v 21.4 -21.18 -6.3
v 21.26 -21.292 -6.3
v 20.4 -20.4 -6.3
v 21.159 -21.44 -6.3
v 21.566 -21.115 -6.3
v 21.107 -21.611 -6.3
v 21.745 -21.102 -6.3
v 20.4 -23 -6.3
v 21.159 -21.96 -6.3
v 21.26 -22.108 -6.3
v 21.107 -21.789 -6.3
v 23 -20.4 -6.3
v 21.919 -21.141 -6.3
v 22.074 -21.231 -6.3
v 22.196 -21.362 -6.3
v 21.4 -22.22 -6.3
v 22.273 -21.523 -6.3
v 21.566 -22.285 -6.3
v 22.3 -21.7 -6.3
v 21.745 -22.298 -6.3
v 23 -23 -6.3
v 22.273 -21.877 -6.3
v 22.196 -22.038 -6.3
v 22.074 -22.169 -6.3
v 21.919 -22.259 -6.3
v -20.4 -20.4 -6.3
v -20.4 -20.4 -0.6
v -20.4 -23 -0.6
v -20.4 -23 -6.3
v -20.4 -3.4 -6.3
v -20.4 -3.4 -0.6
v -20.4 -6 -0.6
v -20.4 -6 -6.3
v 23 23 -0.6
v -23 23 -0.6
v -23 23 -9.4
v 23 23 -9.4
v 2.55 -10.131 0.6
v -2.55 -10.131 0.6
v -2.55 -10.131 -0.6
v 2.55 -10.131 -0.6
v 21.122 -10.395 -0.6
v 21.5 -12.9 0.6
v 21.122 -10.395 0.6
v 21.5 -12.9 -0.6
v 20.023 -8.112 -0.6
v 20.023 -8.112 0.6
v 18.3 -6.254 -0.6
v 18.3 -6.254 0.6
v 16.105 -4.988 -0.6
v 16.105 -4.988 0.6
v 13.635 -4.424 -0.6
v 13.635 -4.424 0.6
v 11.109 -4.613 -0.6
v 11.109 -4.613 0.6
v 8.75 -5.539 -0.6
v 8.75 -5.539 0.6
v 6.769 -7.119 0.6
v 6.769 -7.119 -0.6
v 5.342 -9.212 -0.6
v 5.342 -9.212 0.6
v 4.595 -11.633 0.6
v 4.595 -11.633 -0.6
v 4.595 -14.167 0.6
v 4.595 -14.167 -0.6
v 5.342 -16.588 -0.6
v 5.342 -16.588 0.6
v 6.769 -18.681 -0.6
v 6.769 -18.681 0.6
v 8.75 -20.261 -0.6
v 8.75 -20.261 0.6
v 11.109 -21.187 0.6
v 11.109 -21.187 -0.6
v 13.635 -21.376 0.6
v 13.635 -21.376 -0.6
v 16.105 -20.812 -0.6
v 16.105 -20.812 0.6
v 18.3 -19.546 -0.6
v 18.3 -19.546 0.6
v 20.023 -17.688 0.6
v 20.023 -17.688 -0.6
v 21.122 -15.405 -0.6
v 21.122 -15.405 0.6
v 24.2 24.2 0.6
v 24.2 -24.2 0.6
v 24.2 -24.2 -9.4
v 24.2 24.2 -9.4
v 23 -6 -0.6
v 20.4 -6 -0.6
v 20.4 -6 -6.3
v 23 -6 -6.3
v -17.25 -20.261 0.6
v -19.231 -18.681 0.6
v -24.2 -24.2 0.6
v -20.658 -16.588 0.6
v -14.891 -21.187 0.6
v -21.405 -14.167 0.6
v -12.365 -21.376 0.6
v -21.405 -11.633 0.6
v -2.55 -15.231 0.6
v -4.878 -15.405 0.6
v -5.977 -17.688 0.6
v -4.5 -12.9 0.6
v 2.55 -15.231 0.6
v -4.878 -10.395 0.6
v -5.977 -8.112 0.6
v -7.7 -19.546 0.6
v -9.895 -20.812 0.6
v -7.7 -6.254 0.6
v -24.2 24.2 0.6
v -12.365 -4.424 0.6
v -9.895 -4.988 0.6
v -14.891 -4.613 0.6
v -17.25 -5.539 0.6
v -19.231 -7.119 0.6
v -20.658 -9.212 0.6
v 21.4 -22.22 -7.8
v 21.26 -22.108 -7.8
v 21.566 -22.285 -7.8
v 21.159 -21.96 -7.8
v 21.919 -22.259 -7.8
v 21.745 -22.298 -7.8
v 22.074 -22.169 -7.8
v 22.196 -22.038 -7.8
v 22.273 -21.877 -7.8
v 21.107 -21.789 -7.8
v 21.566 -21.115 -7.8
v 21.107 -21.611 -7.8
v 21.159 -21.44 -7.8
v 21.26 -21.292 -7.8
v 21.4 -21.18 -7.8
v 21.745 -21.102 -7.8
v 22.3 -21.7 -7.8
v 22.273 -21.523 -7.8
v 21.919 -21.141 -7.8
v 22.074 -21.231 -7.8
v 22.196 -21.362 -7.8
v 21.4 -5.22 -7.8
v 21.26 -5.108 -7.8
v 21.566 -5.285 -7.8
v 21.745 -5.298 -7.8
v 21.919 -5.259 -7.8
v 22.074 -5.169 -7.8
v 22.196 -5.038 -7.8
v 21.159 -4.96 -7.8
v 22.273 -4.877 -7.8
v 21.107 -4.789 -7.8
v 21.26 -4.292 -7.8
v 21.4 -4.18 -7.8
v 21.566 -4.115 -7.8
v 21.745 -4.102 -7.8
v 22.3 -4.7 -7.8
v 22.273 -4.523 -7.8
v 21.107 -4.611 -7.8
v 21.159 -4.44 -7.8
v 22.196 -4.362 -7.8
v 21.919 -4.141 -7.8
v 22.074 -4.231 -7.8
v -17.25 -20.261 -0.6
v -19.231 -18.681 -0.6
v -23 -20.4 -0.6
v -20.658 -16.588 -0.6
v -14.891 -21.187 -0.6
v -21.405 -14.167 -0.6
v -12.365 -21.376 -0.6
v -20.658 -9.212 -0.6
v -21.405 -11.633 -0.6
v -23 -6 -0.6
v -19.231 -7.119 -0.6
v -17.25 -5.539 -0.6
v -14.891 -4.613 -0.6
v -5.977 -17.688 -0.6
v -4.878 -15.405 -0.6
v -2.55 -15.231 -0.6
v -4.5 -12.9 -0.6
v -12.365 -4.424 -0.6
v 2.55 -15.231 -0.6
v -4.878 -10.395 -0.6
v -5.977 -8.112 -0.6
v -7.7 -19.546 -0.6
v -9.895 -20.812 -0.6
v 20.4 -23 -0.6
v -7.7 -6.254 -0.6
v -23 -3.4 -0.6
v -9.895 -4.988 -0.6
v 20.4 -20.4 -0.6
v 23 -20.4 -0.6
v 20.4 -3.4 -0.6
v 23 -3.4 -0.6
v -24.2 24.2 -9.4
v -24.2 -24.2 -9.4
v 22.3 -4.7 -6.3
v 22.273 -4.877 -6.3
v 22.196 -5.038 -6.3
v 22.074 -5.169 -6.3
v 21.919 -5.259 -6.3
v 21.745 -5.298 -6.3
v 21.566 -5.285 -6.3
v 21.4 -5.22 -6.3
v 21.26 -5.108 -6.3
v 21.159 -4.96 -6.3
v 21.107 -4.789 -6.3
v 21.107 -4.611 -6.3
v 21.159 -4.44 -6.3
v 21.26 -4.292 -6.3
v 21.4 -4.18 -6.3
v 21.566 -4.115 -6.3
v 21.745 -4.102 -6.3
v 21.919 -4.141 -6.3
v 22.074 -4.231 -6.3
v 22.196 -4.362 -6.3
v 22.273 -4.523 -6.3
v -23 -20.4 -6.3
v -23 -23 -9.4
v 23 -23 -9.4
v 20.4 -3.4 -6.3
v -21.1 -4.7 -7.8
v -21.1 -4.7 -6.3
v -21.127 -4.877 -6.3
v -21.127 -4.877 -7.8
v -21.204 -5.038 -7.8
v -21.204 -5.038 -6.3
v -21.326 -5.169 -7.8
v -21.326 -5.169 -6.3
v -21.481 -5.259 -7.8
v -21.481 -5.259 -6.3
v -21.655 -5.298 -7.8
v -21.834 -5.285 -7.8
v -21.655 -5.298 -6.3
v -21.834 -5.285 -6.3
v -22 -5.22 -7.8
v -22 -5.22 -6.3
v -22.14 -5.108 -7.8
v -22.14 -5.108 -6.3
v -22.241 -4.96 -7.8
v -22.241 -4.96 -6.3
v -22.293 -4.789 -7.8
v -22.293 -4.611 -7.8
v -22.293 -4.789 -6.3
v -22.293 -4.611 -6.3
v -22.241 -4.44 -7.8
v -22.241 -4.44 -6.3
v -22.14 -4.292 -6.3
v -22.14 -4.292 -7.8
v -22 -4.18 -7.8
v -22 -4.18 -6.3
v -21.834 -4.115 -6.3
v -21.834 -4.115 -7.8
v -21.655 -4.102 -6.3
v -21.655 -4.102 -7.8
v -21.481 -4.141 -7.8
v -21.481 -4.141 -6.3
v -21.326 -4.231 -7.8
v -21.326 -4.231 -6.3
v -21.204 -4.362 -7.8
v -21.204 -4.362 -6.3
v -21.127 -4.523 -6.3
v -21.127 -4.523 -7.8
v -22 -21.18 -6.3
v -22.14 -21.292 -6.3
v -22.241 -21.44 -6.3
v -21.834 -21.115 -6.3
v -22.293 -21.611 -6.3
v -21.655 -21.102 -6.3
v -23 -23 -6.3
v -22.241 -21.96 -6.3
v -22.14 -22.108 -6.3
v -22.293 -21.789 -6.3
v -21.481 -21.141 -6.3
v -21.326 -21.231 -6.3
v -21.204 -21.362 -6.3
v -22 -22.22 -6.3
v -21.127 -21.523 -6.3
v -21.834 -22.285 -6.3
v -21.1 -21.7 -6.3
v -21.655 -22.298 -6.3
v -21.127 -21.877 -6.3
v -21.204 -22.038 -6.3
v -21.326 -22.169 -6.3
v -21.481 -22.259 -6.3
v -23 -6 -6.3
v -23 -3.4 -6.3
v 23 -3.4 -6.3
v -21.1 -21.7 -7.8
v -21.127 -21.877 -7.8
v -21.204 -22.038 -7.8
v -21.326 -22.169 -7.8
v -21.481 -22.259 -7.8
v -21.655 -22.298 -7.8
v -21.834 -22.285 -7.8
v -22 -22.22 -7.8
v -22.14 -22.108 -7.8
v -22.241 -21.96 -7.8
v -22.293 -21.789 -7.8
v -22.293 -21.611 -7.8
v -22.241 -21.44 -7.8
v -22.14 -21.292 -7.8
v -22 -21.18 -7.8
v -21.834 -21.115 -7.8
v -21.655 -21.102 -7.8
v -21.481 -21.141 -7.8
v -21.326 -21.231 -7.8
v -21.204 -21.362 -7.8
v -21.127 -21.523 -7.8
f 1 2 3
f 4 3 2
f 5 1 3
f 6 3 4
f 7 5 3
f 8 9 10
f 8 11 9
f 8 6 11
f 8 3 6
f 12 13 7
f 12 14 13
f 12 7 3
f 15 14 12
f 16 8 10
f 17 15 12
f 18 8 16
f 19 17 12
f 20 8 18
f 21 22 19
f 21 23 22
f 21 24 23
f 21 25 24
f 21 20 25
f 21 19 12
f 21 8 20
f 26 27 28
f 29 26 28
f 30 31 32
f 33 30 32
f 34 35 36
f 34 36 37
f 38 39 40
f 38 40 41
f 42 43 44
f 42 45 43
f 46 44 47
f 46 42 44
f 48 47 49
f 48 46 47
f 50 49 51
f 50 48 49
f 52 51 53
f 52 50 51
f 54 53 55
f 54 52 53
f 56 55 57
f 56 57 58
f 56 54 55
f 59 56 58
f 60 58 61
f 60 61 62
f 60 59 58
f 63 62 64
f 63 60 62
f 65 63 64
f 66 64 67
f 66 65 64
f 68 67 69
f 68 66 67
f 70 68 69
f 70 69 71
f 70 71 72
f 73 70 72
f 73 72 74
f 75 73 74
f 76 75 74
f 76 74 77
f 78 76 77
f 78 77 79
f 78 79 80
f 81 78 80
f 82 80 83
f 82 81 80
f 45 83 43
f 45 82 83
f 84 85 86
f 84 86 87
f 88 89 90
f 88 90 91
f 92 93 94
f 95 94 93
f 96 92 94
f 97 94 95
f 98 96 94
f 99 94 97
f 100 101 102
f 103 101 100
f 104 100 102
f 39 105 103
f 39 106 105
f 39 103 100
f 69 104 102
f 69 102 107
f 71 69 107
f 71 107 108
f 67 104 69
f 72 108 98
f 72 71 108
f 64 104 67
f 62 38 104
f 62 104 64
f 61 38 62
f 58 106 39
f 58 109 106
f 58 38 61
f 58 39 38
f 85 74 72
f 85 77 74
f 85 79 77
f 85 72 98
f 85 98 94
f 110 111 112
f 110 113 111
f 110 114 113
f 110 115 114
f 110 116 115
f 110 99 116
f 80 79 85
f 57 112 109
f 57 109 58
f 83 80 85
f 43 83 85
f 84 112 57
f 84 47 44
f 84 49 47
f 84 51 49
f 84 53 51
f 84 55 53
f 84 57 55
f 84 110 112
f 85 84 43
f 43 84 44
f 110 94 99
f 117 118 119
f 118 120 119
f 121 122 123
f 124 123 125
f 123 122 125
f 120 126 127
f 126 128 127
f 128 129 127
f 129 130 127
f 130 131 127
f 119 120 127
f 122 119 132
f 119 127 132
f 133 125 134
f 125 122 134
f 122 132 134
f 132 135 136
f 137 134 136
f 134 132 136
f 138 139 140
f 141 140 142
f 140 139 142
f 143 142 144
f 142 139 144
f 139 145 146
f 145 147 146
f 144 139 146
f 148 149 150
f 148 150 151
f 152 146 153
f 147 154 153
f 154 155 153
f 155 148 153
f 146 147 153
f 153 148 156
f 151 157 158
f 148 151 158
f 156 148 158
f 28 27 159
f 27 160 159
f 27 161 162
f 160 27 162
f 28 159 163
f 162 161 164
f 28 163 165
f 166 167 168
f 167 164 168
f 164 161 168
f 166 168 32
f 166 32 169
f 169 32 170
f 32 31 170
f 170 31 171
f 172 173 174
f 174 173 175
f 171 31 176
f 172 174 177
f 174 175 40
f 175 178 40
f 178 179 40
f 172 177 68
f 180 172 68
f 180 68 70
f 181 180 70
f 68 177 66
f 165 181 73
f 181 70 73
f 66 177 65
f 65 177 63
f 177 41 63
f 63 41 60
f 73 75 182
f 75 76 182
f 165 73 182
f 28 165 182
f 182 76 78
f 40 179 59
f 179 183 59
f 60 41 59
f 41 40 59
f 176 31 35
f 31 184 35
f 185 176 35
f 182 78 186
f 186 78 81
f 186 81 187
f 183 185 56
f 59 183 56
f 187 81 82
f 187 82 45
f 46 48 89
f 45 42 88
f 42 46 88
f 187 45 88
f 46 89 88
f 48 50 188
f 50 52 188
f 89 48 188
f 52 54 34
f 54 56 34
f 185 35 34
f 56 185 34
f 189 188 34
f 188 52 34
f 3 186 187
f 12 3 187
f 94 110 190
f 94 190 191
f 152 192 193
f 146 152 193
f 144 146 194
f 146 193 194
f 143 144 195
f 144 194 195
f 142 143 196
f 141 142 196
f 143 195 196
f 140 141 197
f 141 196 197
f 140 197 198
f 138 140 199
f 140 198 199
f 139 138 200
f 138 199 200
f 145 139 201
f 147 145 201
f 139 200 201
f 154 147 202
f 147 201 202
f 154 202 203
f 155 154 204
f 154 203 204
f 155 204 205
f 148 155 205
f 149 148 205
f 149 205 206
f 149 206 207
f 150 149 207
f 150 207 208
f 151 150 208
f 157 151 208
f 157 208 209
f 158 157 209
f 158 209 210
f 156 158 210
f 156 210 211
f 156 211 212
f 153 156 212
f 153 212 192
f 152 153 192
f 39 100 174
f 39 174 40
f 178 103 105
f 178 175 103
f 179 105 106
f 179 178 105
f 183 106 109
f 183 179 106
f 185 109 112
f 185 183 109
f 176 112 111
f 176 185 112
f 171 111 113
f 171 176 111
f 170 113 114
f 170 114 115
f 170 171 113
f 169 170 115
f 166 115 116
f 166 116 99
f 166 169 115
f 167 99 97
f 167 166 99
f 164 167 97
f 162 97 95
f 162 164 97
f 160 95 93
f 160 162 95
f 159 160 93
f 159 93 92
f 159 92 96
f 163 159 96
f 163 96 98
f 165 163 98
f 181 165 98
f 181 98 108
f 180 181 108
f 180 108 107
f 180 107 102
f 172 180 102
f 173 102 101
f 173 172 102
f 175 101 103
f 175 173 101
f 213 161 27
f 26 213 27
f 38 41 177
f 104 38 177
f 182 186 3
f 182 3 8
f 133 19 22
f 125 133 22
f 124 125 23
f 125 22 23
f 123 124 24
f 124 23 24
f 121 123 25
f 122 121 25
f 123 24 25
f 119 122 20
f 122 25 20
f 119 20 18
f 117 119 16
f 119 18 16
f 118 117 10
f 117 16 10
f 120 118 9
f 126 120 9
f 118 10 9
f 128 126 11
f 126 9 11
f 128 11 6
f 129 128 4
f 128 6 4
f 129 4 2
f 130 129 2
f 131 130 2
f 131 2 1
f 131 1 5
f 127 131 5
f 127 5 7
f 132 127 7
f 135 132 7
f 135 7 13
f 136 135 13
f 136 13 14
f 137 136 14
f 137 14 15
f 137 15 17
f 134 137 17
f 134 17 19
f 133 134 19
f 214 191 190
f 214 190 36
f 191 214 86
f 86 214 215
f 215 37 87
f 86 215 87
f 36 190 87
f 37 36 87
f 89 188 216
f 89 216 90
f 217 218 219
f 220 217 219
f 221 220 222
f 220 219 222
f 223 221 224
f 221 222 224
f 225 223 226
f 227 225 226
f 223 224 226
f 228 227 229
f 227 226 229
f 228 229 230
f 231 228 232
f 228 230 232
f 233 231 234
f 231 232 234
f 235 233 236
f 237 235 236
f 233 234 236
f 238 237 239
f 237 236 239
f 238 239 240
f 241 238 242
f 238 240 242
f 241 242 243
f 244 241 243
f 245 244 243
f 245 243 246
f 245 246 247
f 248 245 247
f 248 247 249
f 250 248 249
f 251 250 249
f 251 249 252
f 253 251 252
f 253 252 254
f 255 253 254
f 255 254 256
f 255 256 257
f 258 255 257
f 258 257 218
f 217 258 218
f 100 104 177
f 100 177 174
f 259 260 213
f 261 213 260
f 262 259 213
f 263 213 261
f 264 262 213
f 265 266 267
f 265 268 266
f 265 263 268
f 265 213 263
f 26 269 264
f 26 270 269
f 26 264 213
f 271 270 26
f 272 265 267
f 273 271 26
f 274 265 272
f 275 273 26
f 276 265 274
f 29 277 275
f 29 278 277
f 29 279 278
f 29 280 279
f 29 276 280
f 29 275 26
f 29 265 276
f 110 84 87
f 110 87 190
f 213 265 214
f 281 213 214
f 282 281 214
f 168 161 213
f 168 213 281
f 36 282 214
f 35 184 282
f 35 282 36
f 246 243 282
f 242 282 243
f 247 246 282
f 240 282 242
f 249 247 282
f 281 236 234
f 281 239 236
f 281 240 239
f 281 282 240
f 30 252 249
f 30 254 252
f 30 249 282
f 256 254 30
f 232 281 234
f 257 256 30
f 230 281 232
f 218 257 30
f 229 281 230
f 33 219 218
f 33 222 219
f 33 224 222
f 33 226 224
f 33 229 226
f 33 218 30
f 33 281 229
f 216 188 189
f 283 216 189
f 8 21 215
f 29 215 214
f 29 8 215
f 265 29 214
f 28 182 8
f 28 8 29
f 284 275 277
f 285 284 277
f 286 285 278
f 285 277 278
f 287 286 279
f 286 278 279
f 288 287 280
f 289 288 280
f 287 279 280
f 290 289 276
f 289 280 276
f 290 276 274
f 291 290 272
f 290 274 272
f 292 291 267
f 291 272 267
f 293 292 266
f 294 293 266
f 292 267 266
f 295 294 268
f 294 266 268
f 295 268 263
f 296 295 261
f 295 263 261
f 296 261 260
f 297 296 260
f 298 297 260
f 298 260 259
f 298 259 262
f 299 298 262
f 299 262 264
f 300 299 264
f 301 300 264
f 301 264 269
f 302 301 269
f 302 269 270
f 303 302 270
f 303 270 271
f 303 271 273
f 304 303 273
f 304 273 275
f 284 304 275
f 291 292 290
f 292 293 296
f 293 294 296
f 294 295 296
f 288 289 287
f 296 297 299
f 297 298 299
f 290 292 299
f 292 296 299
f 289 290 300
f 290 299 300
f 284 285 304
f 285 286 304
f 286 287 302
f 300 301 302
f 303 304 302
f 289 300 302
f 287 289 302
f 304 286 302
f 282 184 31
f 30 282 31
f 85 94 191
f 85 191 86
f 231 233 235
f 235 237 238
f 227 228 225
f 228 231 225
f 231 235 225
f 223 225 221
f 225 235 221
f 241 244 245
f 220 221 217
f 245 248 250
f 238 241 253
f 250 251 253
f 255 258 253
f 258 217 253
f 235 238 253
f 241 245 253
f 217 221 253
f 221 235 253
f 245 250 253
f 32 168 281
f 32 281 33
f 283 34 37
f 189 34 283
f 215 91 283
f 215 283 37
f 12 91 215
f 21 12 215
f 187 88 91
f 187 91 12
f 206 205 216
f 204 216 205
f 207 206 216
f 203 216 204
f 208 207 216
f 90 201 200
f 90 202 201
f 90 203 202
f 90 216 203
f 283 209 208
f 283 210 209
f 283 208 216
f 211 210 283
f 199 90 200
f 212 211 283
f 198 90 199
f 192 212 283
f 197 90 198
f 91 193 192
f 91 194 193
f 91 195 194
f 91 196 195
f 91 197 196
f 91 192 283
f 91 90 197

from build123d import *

# Parameters (mm, degrees)
F0_W     = 23
F0_H     = 23
F0_R     = 8.5
F1_DEPTH = 0.6
F3_DEPTH = 10
F4_W     = 2.6
F4_H     = 2.6
F4_R     = 0.6
F5_DEPTH = 5.7
F6_DEPTH = 7.2


with BuildPart() as f1:
    # F0 (on Top) → F1 (new body, symmetric)
    with BuildSketch(Plane.XY):
        with Locations((-11.5, 11.5)):
            Rectangle(F0_W, F0_H)
        Polygon((0, -10.1312079445), (0, 0), (-23, 0), (-23, -23), (0, -23), (0, -15.2312079445), (-2.55, -15.2312079445), (-2.55, -10.1312079445), align=None)
        with Locations((-13, -12.9)):
            Circle(F0_R, mode=Mode.SUBTRACT)
        with Locations((11.5, 11.5)):
            Rectangle(F0_W, F0_H)
        Polygon((23, 0), (0, 0), (0, -10.1312079445), (2.55, -10.1312079445), (2.55, -15.2312079445), (0, -15.2312079445), (0, -23), (23, -23), align=None)
        with Locations((13, -12.9)):
            Circle(F0_R, mode=Mode.SUBTRACT)
    extrude(amount=F1_DEPTH, both=True)

    # F2 (on face) → F3 (join)
    with BuildSketch(Plane.XY.offset(0.6)):
        Polygon((0, 23), (23, 23), (23, -23), (0, -23), (0, -24.2), (24.2, -24.2), (24.2, 24.2), (0, 24.2), align=None)
        Polygon((-23, 23), (0, 23), (0, 24.2), (-24.2, 24.2), (-24.2, -24.2), (0, -24.2), (0, -23), (-23, -23), align=None)
    extrude(amount=-F3_DEPTH)

    # F4 (on face) → F5 (join)
    with BuildSketch(Plane(origin=(0, 0, -0.6), x_dir=(1, 0, 0), z_dir=(0, 0, -1))):
        with Locations((21.7, 21.7)):
            Rectangle(F4_W, F4_H)
        with Locations((21.7, 21.7)):
            Circle(F4_R, mode=Mode.SUBTRACT)
        with Locations((-21.7, 21.7)):
            Rectangle(F4_W, F4_H)
        with Locations((-21.7, 21.7)):
            Circle(F4_R, mode=Mode.SUBTRACT)
        with Locations((-21.7, 4.7)):
            Rectangle(F4_W, F4_H)
        with Locations((-21.7, 4.7)):
            Circle(F4_R, mode=Mode.SUBTRACT)
        with Locations((21.7, 4.7000000451)):
            Rectangle(F4_W, F4_H)
        with Locations((21.7, 4.7000000451)):
            Circle(F4_R, mode=Mode.SUBTRACT)
    extrude(amount=F5_DEPTH)

    # F6 (add): faces of the model
    f6_faces = [f1.faces().sort_by_distance(p)[0] for p in [
        (-21.7, -4.7, -0.6),
        (-21.7, -21.7, -0.6),
        (21.7, -21.7, -0.6),
        (21.7, -4.7000000451, -0.6),
    ]]
    extrude(f6_faces, amount=F6_DEPTH)


solid = f1.part
